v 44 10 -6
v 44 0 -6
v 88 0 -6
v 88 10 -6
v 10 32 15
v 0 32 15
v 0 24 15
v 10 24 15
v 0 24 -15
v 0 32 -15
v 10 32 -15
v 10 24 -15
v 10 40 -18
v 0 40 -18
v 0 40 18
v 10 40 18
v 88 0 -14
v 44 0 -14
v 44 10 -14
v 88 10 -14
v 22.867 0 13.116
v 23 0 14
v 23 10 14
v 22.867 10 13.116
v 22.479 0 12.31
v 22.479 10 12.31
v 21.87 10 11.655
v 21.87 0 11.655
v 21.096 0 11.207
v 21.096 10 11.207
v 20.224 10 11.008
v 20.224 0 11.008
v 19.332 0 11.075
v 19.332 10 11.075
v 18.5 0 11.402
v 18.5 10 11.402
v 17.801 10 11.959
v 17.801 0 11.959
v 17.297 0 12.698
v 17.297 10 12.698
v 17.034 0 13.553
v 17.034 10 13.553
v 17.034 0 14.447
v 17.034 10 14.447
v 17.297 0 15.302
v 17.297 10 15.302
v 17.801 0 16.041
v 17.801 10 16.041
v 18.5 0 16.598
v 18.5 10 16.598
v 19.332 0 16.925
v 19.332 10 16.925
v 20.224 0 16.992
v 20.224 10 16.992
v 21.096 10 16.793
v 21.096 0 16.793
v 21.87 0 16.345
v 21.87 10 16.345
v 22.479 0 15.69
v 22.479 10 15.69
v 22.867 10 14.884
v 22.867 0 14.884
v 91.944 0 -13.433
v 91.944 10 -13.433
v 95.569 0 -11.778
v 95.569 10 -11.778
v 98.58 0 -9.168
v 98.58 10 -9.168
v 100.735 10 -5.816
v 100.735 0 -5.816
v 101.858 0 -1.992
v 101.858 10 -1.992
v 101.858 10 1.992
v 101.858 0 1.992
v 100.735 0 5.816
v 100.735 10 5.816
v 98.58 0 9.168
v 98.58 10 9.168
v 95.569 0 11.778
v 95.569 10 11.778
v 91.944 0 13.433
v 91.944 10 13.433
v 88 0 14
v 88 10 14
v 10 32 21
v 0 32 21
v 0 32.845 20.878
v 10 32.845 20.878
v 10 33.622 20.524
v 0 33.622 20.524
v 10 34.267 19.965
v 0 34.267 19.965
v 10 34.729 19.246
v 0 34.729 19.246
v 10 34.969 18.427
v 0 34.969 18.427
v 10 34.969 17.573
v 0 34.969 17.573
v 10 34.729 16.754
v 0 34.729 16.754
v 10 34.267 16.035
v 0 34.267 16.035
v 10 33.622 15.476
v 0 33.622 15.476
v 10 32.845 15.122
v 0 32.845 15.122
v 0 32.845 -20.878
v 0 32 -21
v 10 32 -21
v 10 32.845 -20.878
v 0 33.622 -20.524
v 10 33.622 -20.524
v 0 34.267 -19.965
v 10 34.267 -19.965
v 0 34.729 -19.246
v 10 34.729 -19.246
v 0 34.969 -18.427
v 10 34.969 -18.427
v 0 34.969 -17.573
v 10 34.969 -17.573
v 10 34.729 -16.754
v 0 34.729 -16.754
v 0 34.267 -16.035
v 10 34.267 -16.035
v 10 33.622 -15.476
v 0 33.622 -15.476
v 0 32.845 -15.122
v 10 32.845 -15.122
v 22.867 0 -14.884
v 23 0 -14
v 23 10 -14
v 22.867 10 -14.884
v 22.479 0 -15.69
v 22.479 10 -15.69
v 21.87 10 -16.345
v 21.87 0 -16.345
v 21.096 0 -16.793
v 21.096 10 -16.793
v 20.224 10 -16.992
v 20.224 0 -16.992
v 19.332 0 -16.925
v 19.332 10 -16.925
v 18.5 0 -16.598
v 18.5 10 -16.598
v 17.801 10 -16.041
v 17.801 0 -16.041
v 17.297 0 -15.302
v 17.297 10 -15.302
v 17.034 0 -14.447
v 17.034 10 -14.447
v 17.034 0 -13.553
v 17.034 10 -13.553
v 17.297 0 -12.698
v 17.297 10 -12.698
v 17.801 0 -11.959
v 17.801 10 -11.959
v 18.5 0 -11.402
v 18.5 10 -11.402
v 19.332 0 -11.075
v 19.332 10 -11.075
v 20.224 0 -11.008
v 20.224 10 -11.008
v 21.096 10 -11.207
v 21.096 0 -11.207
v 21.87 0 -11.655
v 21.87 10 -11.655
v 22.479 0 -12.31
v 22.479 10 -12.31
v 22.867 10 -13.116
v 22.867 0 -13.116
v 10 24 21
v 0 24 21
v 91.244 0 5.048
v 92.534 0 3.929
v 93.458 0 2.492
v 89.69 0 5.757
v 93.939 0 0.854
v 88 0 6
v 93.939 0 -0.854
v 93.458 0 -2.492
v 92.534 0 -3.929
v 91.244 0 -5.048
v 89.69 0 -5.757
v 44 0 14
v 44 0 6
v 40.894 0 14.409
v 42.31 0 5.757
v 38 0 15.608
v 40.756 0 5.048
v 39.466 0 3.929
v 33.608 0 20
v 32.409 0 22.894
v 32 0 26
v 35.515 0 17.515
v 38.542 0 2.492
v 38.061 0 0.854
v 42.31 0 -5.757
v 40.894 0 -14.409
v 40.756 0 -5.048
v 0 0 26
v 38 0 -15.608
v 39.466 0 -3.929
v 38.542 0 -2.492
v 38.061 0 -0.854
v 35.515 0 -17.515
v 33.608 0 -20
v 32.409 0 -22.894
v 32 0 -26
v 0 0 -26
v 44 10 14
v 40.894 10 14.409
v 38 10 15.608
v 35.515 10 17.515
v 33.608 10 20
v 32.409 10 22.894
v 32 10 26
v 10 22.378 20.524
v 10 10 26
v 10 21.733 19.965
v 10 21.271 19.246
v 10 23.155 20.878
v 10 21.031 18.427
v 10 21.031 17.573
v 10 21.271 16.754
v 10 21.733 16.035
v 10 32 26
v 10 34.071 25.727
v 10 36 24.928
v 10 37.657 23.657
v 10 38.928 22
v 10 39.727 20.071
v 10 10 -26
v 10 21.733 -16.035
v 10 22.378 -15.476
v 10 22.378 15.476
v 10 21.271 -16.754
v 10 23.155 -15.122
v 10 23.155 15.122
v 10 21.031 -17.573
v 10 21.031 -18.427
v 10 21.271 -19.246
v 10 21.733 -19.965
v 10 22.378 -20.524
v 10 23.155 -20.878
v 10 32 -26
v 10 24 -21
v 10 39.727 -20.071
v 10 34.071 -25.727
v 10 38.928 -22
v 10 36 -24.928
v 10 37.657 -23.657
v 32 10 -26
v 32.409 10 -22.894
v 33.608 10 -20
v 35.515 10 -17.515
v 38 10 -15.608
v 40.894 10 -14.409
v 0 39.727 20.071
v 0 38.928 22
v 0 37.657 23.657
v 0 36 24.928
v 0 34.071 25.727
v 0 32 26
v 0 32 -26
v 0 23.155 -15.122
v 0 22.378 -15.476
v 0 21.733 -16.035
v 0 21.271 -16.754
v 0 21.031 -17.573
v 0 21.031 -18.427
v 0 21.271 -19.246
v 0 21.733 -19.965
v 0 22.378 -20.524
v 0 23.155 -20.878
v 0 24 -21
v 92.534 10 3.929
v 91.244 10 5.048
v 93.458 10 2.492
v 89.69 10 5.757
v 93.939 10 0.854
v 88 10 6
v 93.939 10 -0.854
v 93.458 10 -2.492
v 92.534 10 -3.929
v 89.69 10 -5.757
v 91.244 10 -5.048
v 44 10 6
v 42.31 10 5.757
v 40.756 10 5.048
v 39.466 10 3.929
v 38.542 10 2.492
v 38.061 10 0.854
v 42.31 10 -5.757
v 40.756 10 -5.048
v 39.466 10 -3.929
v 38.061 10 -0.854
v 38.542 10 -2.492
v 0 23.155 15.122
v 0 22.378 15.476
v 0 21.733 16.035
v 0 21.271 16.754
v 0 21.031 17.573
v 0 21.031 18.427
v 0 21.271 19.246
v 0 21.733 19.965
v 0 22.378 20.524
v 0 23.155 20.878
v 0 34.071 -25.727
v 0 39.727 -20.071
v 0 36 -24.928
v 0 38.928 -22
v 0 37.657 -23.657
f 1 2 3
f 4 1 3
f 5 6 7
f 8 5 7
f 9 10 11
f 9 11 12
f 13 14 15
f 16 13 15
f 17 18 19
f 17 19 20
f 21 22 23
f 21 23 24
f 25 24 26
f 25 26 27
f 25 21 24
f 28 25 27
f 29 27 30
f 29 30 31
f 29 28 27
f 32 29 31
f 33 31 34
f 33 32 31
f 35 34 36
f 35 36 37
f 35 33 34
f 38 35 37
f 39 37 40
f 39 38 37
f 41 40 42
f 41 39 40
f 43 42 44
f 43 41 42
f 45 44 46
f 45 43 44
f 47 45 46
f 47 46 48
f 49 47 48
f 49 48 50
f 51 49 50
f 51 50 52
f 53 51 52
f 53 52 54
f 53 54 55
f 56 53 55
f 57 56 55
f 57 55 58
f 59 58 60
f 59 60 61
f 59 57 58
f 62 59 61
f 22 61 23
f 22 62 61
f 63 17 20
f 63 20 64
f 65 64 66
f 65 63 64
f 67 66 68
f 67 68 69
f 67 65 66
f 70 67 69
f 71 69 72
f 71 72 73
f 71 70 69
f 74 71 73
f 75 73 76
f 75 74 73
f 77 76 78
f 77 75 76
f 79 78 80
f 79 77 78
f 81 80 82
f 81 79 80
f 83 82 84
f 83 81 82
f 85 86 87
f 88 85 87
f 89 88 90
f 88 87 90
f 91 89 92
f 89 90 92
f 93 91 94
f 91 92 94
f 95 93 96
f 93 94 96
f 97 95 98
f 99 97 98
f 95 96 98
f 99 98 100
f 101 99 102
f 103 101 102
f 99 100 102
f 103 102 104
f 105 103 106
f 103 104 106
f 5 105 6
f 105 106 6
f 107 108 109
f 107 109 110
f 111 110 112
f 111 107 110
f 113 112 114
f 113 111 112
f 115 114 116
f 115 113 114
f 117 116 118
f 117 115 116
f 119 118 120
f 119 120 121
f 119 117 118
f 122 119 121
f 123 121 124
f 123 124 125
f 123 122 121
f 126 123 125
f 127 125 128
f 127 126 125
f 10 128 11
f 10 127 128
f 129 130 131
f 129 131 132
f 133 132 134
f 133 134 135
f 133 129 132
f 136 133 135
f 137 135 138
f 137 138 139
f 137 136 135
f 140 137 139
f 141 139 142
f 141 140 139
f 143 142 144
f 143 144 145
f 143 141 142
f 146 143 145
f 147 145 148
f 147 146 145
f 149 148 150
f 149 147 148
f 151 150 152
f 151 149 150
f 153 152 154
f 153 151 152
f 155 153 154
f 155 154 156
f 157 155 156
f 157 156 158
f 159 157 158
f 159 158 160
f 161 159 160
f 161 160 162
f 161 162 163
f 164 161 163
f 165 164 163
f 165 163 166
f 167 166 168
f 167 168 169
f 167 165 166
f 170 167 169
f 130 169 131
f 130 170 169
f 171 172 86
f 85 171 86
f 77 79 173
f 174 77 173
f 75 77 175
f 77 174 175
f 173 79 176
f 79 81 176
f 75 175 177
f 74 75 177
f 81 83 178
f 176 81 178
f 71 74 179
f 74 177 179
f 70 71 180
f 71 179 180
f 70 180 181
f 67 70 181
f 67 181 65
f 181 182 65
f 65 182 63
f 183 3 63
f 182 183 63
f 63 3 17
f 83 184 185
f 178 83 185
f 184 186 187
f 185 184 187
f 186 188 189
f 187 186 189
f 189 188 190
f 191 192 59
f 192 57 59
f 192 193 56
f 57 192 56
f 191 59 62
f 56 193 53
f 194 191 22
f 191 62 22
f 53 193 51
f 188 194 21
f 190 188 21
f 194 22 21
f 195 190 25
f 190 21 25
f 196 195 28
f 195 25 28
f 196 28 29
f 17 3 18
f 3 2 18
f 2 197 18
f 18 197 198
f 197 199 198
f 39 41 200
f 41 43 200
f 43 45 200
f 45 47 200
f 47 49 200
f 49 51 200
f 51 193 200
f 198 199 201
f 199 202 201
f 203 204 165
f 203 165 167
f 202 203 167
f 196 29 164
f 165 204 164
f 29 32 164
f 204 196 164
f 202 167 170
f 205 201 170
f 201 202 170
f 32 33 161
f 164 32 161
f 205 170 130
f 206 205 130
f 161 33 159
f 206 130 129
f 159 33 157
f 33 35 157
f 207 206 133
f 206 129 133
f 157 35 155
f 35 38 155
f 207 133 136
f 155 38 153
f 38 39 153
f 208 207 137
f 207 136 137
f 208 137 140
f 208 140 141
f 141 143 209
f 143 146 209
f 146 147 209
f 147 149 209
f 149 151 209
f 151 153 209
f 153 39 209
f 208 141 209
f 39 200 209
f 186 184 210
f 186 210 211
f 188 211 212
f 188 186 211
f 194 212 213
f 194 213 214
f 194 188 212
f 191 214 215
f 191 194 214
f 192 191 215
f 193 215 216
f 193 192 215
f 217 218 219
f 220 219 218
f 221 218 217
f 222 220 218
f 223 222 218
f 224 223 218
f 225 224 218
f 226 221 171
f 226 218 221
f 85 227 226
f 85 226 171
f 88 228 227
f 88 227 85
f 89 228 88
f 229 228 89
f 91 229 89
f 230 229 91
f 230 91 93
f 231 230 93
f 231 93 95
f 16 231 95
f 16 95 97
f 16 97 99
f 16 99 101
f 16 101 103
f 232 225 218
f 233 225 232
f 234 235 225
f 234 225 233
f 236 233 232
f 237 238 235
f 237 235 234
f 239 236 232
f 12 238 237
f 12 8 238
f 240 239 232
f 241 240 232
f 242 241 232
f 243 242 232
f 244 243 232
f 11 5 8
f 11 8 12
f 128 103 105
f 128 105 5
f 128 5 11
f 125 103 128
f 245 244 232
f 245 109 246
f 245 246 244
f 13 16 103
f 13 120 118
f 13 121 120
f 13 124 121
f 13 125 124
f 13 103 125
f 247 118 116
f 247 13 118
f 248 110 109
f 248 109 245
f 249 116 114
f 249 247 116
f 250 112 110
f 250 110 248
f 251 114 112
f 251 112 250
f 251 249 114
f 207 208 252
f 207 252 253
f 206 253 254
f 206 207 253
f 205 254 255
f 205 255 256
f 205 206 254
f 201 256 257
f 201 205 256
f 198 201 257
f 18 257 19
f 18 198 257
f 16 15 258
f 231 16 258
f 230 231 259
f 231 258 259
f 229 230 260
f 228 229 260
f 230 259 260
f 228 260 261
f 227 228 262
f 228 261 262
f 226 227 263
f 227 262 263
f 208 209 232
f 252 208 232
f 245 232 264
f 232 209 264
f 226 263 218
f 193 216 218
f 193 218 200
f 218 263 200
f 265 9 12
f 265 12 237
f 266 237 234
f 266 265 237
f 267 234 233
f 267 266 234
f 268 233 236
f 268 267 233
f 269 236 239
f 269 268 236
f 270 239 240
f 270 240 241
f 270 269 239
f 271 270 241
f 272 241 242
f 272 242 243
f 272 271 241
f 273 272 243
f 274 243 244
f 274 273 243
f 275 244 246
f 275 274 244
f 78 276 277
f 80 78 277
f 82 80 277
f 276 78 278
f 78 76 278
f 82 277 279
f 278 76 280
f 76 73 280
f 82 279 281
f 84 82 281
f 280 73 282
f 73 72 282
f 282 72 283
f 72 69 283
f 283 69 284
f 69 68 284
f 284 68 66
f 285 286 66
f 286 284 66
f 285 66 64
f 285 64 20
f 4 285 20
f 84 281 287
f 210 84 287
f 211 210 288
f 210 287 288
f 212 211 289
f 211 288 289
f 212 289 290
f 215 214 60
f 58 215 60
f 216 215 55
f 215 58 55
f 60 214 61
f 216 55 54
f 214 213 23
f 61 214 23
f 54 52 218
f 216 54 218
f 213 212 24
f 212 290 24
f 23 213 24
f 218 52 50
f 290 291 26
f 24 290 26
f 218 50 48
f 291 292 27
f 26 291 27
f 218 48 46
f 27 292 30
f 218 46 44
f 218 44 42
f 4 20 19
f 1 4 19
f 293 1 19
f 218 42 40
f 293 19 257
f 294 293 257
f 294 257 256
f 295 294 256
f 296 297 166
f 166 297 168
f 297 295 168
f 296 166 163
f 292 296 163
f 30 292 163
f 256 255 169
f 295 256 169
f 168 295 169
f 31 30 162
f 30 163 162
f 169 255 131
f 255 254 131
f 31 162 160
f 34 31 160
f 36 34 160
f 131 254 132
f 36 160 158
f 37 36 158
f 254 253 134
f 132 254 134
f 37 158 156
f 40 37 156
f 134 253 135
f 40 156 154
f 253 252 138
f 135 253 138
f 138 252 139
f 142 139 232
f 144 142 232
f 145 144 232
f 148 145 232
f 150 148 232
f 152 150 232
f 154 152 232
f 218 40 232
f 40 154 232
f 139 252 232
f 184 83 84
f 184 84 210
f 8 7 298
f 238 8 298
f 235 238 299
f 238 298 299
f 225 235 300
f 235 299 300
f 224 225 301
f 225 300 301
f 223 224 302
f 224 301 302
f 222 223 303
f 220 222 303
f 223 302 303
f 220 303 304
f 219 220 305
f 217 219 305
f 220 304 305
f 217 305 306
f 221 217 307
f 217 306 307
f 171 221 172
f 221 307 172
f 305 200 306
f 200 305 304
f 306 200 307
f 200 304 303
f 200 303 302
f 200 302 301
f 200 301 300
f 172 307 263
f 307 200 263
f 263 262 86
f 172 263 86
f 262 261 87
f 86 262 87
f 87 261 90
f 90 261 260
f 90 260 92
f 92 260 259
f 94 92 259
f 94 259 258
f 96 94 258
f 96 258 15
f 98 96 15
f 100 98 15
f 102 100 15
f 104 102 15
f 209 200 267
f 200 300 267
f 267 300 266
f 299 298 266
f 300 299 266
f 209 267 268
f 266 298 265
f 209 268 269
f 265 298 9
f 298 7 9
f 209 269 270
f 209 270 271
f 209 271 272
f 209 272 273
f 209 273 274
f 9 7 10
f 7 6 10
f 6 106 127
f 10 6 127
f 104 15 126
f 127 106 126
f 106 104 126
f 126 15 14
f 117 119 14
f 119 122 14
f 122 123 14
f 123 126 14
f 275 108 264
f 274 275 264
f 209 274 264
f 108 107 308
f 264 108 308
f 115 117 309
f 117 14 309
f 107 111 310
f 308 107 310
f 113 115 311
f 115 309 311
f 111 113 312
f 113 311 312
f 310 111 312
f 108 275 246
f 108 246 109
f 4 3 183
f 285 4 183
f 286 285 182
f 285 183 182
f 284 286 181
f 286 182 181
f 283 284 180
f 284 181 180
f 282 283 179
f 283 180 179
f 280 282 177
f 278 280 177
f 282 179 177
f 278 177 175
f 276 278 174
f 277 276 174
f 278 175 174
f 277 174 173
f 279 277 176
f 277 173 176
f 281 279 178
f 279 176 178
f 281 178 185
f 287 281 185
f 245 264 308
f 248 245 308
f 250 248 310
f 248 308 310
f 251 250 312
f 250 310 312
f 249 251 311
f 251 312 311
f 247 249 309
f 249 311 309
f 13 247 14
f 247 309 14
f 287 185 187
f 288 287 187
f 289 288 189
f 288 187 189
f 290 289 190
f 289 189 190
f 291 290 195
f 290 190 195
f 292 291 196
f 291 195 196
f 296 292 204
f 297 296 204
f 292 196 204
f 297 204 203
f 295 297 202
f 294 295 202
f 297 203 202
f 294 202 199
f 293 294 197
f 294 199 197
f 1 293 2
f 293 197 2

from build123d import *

# Parameters (mm, degrees)
BOSS_EXTRUDE1_DEPTH = 10
SKETCH2_R           = 3
BOSS_EXTRUDE2_DEPTH = 10


with BuildPart() as part:
    # Sketch1 → Boss-Extrude1 (new body)
    with BuildSketch(Plane(origin=(0, 0, 0), x_dir=(0, 0, -1), z_dir=(1, 0, 0))):
        with BuildLine():
            Line((-26, 0), (26, 0))
            Line((26, 0), (26, 32))
            ThreePointArc((26, 32), (23.656854249, 37.656854249), (18, 40))
            Line((18, 40), (-18, 40))
            ThreePointArc((-18, 40), (-23.656854249, 37.656854249), (-26, 32))
            Line((-26, 32), (-26, 0))
        make_face()
        with BuildLine():
            Line((-15, 32), (-15, 24))
            ThreePointArc((-15, 24), (-18, 21), (-21, 24))
            Line((-21, 24), (-21, 32))
            ThreePointArc((-21, 32), (-18, 35), (-15, 32))
        make_face(mode=Mode.SUBTRACT)
        with BuildLine():
            Line((15, 32), (15, 24))
            ThreePointArc((15, 24), (18, 21), (21, 24))
            Line((21, 24), (21, 32))
            ThreePointArc((21, 32), (18, 35), (15, 32))
        make_face(mode=Mode.SUBTRACT)
    extrude(amount=BOSS_EXTRUDE1_DEPTH)

    # Sketch2 → Boss-Extrude2 (add)
    with BuildSketch(Plane(origin=(0, 0, 0), x_dir=(1, 0, 0), z_dir=(0, 1, 0))):
        with BuildLine():
            Line((0, 26), (32, 26))
            ThreePointArc((32, 26), (35.514718626, 17.514718626), (44, 14))
            Line((44, 14), (88, 14))
            ThreePointArc((88, 14), (102, 0), (88, -14))
            Line((88, -14), (44, -14))
            ThreePointArc((44, -14), (35.514718626, -17.514718626), (32, -26))
            Line((32, -26), (0, -26))
            Line((0, -26), (0, 26))
        make_face()
        with Locations((20, 14)):
            Circle(SKETCH2_R, mode=Mode.SUBTRACT)
        with Locations((20, -14)):
            Circle(SKETCH2_R, mode=Mode.SUBTRACT)
        with BuildLine():
            Line((44, 6), (88, 6))
            ThreePointArc((88, 6), (94, 0), (88, -6))
            Line((88, -6), (44, -6))
            ThreePointArc((44, -6), (38, 0), (44, 6))
        make_face(mode=Mode.SUBTRACT)
    extrude(amount=BOSS_EXTRUDE2_DEPTH)


solid = part.part
